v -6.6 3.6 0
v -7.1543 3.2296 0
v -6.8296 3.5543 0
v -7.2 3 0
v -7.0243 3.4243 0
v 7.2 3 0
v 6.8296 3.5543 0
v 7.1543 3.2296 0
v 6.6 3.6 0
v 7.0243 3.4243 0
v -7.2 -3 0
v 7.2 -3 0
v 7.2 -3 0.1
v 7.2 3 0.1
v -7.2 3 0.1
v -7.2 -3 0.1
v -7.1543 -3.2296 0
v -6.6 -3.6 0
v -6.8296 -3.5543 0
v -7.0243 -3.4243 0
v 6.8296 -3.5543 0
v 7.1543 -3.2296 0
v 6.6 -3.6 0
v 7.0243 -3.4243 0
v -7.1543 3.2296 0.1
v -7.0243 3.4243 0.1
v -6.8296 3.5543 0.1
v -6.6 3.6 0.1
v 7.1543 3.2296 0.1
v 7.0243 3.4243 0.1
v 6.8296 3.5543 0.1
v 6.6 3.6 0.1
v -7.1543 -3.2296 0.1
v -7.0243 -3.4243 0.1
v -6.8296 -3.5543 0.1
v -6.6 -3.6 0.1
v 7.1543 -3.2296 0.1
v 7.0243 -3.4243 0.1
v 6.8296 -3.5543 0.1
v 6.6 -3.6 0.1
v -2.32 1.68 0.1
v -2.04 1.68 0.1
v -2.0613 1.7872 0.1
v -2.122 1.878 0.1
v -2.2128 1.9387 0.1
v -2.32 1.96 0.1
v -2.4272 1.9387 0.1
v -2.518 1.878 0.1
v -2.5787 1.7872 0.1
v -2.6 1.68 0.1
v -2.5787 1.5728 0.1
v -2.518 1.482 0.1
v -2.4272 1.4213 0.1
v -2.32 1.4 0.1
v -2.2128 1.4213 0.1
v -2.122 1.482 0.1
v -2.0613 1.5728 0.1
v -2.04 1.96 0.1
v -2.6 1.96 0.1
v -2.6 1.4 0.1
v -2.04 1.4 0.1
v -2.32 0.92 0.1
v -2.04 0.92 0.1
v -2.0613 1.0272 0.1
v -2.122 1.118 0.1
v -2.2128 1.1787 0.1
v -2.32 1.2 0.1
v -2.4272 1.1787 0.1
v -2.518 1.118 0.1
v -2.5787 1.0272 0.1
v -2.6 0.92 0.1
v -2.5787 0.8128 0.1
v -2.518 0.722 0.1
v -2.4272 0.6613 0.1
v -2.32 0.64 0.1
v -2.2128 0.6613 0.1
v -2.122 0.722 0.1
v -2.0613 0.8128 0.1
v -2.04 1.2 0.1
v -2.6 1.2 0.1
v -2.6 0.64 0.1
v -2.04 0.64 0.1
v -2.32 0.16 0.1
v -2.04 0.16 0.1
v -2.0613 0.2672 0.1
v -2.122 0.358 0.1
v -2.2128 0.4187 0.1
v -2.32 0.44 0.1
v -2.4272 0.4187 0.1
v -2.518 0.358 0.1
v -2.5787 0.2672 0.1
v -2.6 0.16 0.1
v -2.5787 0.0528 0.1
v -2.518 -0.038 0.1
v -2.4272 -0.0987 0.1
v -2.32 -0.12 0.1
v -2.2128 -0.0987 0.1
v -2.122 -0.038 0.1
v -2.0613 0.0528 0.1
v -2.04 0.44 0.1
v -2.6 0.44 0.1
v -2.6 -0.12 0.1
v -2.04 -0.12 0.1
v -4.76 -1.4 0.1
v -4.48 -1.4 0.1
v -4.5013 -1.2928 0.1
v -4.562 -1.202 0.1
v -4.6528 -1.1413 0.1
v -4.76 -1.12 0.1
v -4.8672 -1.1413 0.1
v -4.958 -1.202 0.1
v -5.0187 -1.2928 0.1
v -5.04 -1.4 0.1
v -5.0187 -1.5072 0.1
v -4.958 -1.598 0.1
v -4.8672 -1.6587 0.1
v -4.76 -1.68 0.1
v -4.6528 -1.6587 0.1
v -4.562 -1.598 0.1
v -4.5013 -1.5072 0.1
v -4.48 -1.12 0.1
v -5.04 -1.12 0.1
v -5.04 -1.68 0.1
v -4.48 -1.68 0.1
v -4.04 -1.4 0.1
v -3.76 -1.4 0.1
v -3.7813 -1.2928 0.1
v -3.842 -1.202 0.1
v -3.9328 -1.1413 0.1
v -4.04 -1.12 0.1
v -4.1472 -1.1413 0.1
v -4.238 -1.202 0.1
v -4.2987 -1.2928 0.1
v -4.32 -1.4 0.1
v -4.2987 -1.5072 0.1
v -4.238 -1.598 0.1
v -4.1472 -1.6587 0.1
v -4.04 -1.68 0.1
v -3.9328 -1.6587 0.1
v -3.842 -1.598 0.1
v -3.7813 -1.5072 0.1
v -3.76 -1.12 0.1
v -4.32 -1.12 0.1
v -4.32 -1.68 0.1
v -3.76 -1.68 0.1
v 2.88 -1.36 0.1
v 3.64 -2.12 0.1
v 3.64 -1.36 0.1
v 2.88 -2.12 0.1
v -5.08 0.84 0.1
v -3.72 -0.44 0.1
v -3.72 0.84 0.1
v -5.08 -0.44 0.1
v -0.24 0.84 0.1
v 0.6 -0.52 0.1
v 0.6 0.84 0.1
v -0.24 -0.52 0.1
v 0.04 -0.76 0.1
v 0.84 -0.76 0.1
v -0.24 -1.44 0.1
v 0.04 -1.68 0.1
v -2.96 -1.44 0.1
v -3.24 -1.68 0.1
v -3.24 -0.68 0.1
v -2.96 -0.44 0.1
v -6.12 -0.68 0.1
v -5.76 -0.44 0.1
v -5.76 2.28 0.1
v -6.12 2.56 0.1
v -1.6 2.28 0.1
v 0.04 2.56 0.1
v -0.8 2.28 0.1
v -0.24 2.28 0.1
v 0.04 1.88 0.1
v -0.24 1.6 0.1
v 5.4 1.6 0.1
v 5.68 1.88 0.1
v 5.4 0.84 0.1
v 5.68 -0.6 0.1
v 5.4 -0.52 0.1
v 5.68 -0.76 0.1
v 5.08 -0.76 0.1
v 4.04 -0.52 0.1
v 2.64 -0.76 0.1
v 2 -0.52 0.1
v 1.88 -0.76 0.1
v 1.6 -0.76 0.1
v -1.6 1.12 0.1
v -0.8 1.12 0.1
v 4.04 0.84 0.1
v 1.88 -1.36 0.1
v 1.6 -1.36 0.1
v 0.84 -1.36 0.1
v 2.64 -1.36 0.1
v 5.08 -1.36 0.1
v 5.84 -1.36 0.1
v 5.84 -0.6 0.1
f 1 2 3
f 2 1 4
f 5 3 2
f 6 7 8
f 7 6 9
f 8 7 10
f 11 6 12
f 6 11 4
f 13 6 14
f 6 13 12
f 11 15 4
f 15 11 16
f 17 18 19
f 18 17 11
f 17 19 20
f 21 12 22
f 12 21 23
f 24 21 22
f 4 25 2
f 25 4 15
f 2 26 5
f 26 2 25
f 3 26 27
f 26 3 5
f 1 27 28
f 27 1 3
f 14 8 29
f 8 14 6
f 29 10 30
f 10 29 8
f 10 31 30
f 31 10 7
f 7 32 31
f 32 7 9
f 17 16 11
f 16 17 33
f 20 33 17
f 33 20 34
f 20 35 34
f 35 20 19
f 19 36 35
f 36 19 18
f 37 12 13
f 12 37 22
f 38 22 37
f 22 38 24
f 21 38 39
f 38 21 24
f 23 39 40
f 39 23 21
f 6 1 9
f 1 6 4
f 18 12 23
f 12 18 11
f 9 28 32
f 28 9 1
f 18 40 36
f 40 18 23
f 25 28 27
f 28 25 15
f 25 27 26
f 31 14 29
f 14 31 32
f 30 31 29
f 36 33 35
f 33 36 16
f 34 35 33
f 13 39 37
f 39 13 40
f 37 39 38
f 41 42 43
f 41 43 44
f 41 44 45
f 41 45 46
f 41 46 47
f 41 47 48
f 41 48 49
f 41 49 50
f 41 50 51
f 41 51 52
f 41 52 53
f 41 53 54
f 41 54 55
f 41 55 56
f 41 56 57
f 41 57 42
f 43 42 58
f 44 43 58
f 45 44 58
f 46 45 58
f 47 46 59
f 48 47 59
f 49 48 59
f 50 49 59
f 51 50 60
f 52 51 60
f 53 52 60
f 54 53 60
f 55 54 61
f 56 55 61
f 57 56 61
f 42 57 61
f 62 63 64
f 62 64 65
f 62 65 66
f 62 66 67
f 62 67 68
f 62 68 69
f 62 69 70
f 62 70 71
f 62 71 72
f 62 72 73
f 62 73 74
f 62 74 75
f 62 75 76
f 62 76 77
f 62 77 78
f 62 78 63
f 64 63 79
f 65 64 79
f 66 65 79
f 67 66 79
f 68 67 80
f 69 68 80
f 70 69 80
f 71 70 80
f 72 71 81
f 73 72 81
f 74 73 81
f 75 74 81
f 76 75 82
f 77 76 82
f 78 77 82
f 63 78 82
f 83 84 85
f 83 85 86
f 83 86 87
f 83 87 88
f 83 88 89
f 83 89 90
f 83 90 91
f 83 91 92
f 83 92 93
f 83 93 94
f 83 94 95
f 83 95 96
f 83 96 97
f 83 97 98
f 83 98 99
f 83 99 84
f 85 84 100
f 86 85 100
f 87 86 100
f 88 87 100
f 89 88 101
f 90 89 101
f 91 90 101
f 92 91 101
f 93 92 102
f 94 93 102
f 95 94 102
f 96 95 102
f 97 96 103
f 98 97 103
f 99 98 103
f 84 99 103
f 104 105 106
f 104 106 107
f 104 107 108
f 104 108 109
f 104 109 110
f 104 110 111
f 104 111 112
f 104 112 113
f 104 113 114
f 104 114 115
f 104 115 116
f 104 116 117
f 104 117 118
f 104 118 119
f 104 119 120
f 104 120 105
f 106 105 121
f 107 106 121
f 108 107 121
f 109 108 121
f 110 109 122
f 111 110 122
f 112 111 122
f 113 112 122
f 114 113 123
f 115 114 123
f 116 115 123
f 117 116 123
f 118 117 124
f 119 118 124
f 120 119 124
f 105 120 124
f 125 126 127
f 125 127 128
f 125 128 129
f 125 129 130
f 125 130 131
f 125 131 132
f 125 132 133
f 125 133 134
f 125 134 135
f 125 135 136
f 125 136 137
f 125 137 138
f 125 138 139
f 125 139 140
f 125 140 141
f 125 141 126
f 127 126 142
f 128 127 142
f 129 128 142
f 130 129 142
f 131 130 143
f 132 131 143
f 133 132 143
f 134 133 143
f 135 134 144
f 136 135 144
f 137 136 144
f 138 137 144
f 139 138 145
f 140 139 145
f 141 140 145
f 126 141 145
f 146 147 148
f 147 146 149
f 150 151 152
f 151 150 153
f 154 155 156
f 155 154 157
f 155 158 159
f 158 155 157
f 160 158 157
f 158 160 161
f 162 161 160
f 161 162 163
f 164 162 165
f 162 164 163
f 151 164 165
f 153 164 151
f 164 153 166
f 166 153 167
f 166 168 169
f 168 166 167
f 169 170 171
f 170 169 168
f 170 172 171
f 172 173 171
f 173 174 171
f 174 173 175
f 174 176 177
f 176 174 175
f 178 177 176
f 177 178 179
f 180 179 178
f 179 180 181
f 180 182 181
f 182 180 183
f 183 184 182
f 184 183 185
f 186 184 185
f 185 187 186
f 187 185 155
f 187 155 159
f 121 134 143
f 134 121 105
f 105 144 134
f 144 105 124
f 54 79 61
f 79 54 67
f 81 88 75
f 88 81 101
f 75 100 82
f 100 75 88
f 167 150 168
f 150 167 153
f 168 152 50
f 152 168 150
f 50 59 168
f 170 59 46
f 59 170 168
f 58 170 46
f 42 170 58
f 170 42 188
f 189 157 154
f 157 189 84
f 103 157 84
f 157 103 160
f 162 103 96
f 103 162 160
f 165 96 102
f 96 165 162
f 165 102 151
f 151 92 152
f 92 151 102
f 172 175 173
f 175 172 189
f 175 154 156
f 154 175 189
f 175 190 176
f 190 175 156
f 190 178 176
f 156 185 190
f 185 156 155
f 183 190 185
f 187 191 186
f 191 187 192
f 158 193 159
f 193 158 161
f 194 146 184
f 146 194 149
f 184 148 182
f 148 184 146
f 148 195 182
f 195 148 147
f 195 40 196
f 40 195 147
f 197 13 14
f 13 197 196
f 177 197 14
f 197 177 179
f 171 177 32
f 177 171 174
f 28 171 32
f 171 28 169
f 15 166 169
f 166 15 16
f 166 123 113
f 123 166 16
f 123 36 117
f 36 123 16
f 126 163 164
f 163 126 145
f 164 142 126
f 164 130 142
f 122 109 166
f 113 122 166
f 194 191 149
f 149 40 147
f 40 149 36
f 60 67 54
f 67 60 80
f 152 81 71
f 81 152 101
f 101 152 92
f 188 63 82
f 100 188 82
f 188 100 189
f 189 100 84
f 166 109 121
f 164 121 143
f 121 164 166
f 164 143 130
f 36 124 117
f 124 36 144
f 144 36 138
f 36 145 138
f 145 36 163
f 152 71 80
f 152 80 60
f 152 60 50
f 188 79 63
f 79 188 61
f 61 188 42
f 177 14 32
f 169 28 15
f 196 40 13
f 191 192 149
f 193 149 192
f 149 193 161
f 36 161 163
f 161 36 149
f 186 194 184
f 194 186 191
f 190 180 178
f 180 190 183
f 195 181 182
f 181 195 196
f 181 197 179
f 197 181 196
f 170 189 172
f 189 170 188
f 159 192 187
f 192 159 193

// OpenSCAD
// file: ../p/box3u12.scad
use <../lib.scad>
function ldraw_lib__box3u12() = [
// 0 Box with 3 Parallel Faces without Any Edges
// 0 Name: box3u12.dat
// 0 Author: J.C. Tchang [tchang]
// 0 !LDRAW_ORG Primitive UPDATE 2014-02
// 0 !LICENSE Licensed under CC BY 4.0 : see CAreadme.txt
// 
// 0 BFC CERTIFY CCW
  [0,"BFC","CERTIFY"],
  [0,"BFC","CCW"],
// 
// 0 !HISTORY 2014-12-23 [PTadmin] Official Update 2014-02
// 
// 
// 4 16 -1 1 1 1 1 1 1 1 -1 -1 1 -1
  [4,16,-1,1,1,1,1,1,1,1,-1,-1,1,-1],
// 4 16 -1 1 1 -1 0 1 1 0 1 1 1 1
  [4,16,-1,1,1,-1,0,1,1,0,1,1,1,1],
// 4 16 1 1 -1 1 0 -1 -1 0 -1 -1 1 -1
  [4,16,1,1,-1,1,0,-1,-1,0,-1,-1,1,-1],
];
module ldraw_lib__box3u12(step=0, col=false, unit=2/5, alt=false, line=0.2, solid=!$preview)
    makepoly(ldraw_lib__box3u12(), step=step, col=col, unit=unit, alt=alt, line=line, solid=solid);
ldraw_lib__box3u12(line=0.2);
// file: ../p/1-4cyli.scad
use <../lib.scad>
function ldraw_lib__1_4cyli() = [
// 0 Cylinder 0.25
// 0 Name: 1-4cyli.dat
// 0 Author: James Jessiman
// 0 !LDRAW_ORG Primitive UPDATE 2012-01
// 0 !LICENSE Licensed under CC BY 4.0 : see CAreadme.txt
// 
// 0 BFC CERTIFY CCW
  [0,"BFC","CERTIFY"],
  [0,"BFC","CCW"],
// 
// 0 !HISTORY 2002-03-23 [sbliss] Added BFC statement.
// 0 !HISTORY 2002-04-25 [PTadmin] Official Update 2002-02
// 0 !HISTORY 2007-06-22 [PTadmin] Header formatted for Contributor Agreement
// 0 !HISTORY 2008-07-01 [PTadmin] Official Update 2008-01
// 0 !HISTORY 2012-02-16 [Philo] Changed to CCW
// 0 !HISTORY 2012-03-30 [PTadmin] Official Update 2012-01
// 
// 
// 4 16 1 1 0 0.9239 1 0.3827 0.9239 0 0.3827 1 0 0
  [4,16,1,1,0,0.9239,1,0.3827,0.9239,0,0.3827,1,0,0],
// 5 24 1 0 0 1 1 0 0.9239 0 0.3827 1 0 -1
  [5,24,1,0,0,1,1,0,0.9239,0,0.3827,1,0,-1],
// 4 16 0.9239 1 0.3827 0.7071 1 0.7071 0.7071 0 0.7071 0.9239 0 0.3827
  [4,16,0.9239,1,0.3827,0.7071,1,0.7071,0.7071,0,0.7071,0.9239,0,0.3827],
// 5 24 0.9239 0 0.3827 0.9239 1 0.3827 0.7071 0 0.7071 1 0 0
  [5,24,0.9239,0,0.3827,0.9239,1,0.3827,0.7071,0,0.7071,1,0,0],
// 4 16 0.7071 1 0.7071 0.3827 1 0.9239 0.3827 0 0.9239 0.7071 0 0.7071
  [4,16,0.7071,1,0.7071,0.3827,1,0.9239,0.3827,0,0.9239,0.7071,0,0.7071],
// 5 24 0.7071 0 0.7071 0.7071 1 0.7071 0.3827 0 0.9239 0.9239 0 0.3827
  [5,24,0.7071,0,0.7071,0.7071,1,0.7071,0.3827,0,0.9239,0.9239,0,0.3827],
// 4 16 0.3827 1 0.9239 0 1 1 0 0 1 0.3827 0 0.9239
  [4,16,0.3827,1,0.9239,0,1,1,0,0,1,0.3827,0,0.9239],
// 5 24 0.3827 0 0.9239 0.3827 1 0.9239 0 0 1 0.7071 0 0.7071
  [5,24,0.3827,0,0.9239,0.3827,1,0.9239,0,0,1,0.7071,0,0.7071],
// 5 24 0 0 1 0 1 1 0.3827 0 0.9239 -1 0 1
  [5,24,0,0,1,0,1,1,0.3827,0,0.9239,-1,0,1],
];
module ldraw_lib__1_4cyli(step=0, col=false, unit=2/5, alt=false, line=0.2, solid=!$preview)
    makepoly(ldraw_lib__1_4cyli(), step=step, col=col, unit=unit, alt=alt, line=line, solid=solid);
ldraw_lib__1_4cyli(line=0.2);
// file: s/stickerback009x018.scad
use <../../lib.scad>
use <../../p/1-4chrd.scad>
use <../../p/1-4cyli.scad>
use <../../p/box3u12.scad>
function ldraw_lib__s__stickerback009x018() = [
// 0 ~Sticker Back  0.9 x  1.8
// 0 Name: s\stickerback009x018.dat
// 0 Author: Massimo Maso [Sirio]
// 0 !LDRAW_ORG Subpart UPDATE 2026-05
// 0 !LICENSE Licensed under CC BY 4.0 : see CAreadme.txt
// 
// 0 BFC CERTIFY CCW
  [0,"BFC","CERTIFY"],
  [0,"BFC","CCW"],
// 
// 0 !HISTORY 2026-05-31 [OrionP] Official Update 2026-05
// 
// 0 // Primitives
// 1 16 -16.5 0 7.5 -1.5 0 0 0 -1 0 0 0 1.5 1-4chrd.dat
  [1,16,-16.5,0,7.5,-1.5,0,0,0,-1,0,0,0,1.5, ldraw_lib__1_4chrd()],
// 1 16 16.5 0 7.5 1.5 0 0 0 -1 0 0 0 1.5 1-4chrd.dat
  [1,16,16.5,0,7.5,1.5,0,0,0,-1,0,0,0,1.5, ldraw_lib__1_4chrd()],
// 1 16 0 -.25 0 0 0 18 0 .25 0 7.5 0 0 box3u12.dat
  [1,16,0,-.25,0,0,0,18,0,.25,0,7.5,0,0, ldraw_lib__box3u12()],
// 1 16 -16.5 0 -7.5 -1.5 0 0 0 -1 0 0 0 -1.5 1-4chrd.dat
  [1,16,-16.5,0,-7.5,-1.5,0,0,0,-1,0,0,0,-1.5, ldraw_lib__1_4chrd()],
// 1 16 16.5 0 -7.5 1.5 0 0 0 -1 0 0 0 -1.5 1-4chrd.dat
  [1,16,16.5,0,-7.5,1.5,0,0,0,-1,0,0,0,-1.5, ldraw_lib__1_4chrd()],
// 1 16 -16.5 -.25 7.5 -1.5 0 0 0 .25 0 0 0 1.5 1-4cyli.dat
  [1,16,-16.5,-.25,7.5,-1.5,0,0,0,.25,0,0,0,1.5, ldraw_lib__1_4cyli()],
// 1 16 16.5 -.25 7.5 1.5 0 0 0 .25 0 0 0 1.5 1-4cyli.dat
  [1,16,16.5,-.25,7.5,1.5,0,0,0,.25,0,0,0,1.5, ldraw_lib__1_4cyli()],
// 1 16 -16.5 -.25 -7.5 -1.5 0 0 0 .25 0 0 0 -1.5 1-4cyli.dat
  [1,16,-16.5,-.25,-7.5,-1.5,0,0,0,.25,0,0,0,-1.5, ldraw_lib__1_4cyli()],
// 1 16 16.5 -.25 -7.5 1.5 0 0 0 .25 0 0 0 -1.5 1-4cyli.dat
  [1,16,16.5,-.25,-7.5,1.5,0,0,0,.25,0,0,0,-1.5, ldraw_lib__1_4cyli()],
// 0 // Bottom face
// 4 16 -18 0 7.5 -16.5 0 9 16.5 0 9 18 0 7.5
  [4,16,-18,0,7.5,-16.5,0,9,16.5,0,9,18,0,7.5],
// 4 16 -18 0 -7.5 18 0 -7.5 16.5 0 -9 -16.5 0 -9
  [4,16,-18,0,-7.5,18,0,-7.5,16.5,0,-9,-16.5,0,-9],
// 0 // Lateral face
// 4 16 -16.5 0 9 -16.5 -.25 9 16.5 -.25 9 16.5 0 9
  [4,16,-16.5,0,9,-16.5,-.25,9,16.5,-.25,9,16.5,0,9],
// 4 16 16.5 0 -9 16.5 -.25 -9 -16.5 -.25 -9 -16.5 0 -9
  [4,16,16.5,0,-9,16.5,-.25,-9,-16.5,-.25,-9,-16.5,0,-9],
];
module ldraw_lib__s__stickerback009x018(step=0, col=false, unit=2/5, alt=false, line=0.2, solid=!$preview)
    makepoly(ldraw_lib__s__stickerback009x018(), step=step, col=col, unit=unit, alt=alt, line=line, solid=solid);
ldraw_lib__s__stickerback009x018(line=0.2);
// file: ../p/4-4ndis.scad
use <../lib.scad>
function ldraw_lib__4_4ndis() = [
// 0 Disc Negative 1.0
// 0 Name: 4-4ndis.dat
// 0 Author: James Jessiman
// 0 !LDRAW_ORG Primitive UPDATE 2012-01
// 0 !LICENSE Licensed under CC BY 4.0 : see CAreadme.txt
// 
// 0 BFC CERTIFY CCW
  [0,"BFC","CERTIFY"],
  [0,"BFC","CCW"],
// 
// 0 !HISTORY 2002-03-23 [sbliss] Added BFC statement; compacted code
// 0 !HISTORY 2002-04-25 [PTadmin] Official Update 2002-02
// 0 !HISTORY 2007-06-24 [PTadmin] Header formatted for Contributor Agreement
// 0 !HISTORY 2008-07-01 [PTadmin] Official Update 2008-01
// 0 !HISTORY 2012-02-16 [Philo] Changed to CCW
// 0 !HISTORY 2012-03-30 [PTadmin] Official Update 2012-01
// 
// 
// 3 16 0.9239 0 0.3827 1 0 0 1 0 1
  [3,16,0.9239,0,0.3827,1,0,0,1,0,1],
// 3 16 0.7071 0 0.7071 0.9239 0 0.3827 1 0 1
  [3,16,0.7071,0,0.7071,0.9239,0,0.3827,1,0,1],
// 3 16 0.3827 0 0.9239 0.7071 0 0.7071 1 0 1
  [3,16,0.3827,0,0.9239,0.7071,0,0.7071,1,0,1],
// 3 16 0 0 1 0.3827 0 0.9239 1 0 1
  [3,16,0,0,1,0.3827,0,0.9239,1,0,1],
// 3 16 -0.3827 0 0.9239 0 0 1 -1 0 1
  [3,16,-0.3827,0,0.9239,0,0,1,-1,0,1],
// 3 16 -0.7071 0 0.7071 -0.3827 0 0.9239 -1 0 1
  [3,16,-0.7071,0,0.7071,-0.3827,0,0.9239,-1,0,1],
// 3 16 -0.9239 0 0.3827 -0.7071 0 0.7071 -1 0 1
  [3,16,-0.9239,0,0.3827,-0.7071,0,0.7071,-1,0,1],
// 3 16 -1 0 0 -0.9239 0 0.3827 -1 0 1
  [3,16,-1,0,0,-0.9239,0,0.3827,-1,0,1],
// 3 16 -0.9239 0 -0.3827 -1 0 0 -1 0 -1
  [3,16,-0.9239,0,-0.3827,-1,0,0,-1,0,-1],
// 3 16 -0.7071 0 -0.7071 -0.9239 0 -0.3827 -1 0 -1
  [3,16,-0.7071,0,-0.7071,-0.9239,0,-0.3827,-1,0,-1],
// 3 16 -0.3827 0 -0.9239 -0.7071 0 -0.7071 -1 0 -1
  [3,16,-0.3827,0,-0.9239,-0.7071,0,-0.7071,-1,0,-1],
// 3 16 0 0 -1 -0.3827 0 -0.9239 -1 0 -1
  [3,16,0,0,-1,-0.3827,0,-0.9239,-1,0,-1],
// 3 16 0.3827 0 -0.9239 0 0 -1 1 0 -1
  [3,16,0.3827,0,-0.9239,0,0,-1,1,0,-1],
// 3 16 0.7071 0 -0.7071 0.3827 0 -0.9239 1 0 -1
  [3,16,0.7071,0,-0.7071,0.3827,0,-0.9239,1,0,-1],
// 3 16 0.9239 0 -0.3827 0.7071 0 -0.7071 1 0 -1
  [3,16,0.9239,0,-0.3827,0.7071,0,-0.7071,1,0,-1],
// 3 16 1 0 0 0.9239 0 -0.3827 1 0 -1
  [3,16,1,0,0,0.9239,0,-0.3827,1,0,-1],
];
module ldraw_lib__4_4ndis(step=0, col=false, unit=2/5, alt=false, line=0.2, solid=!$preview)
    makepoly(ldraw_lib__4_4ndis(), step=step, col=col, unit=unit, alt=alt, line=line, solid=solid);
ldraw_lib__4_4ndis(line=0.2);
// file: ../p/4-4disc.scad
use <../lib.scad>
function ldraw_lib__4_4disc() = [
// 0 Disc 1.0
// 0 Name: 4-4disc.dat
// 0 Author: James Jessiman
// 0 !LDRAW_ORG Primitive UPDATE 2002-02
// 0 !LICENSE Licensed under CC BY 4.0 : see CAreadme.txt
// 
// 0 BFC CERTIFY CCW
  [0,"BFC","CERTIFY"],
  [0,"BFC","CCW"],
// 
// 0 !HISTORY 1998-12-15 [PTadmin] Official Update 1998-10
// 0 !HISTORY 2002-03-23 [sbliss] Added BFC statement
// 0 !HISTORY 2002-04-25 [PTadmin] Official Update 2002-02
// 0 !HISTORY 2007-06-24 [PTadmin] Header formatted for Contributor Agreement
// 0 !HISTORY 2008-07-01 [PTadmin] Official Update 2008-01
// 
// 
// 3 16 0 0 0 1 0 0 0.9239 0 0.3827
  [3,16,0,0,0,1,0,0,0.9239,0,0.3827],
// 3 16 0 0 0 0.9239 0 0.3827 0.7071 0 0.7071
  [3,16,0,0,0,0.9239,0,0.3827,0.7071,0,0.7071],
// 3 16 0 0 0 0.7071 0 0.7071 0.3827 0 0.9239
  [3,16,0,0,0,0.7071,0,0.7071,0.3827,0,0.9239],
// 3 16 0 0 0 0.3827 0 0.9239 0 0 1
  [3,16,0,0,0,0.3827,0,0.9239,0,0,1],
// 3 16 0 0 0 0 0 1 -0.3827 0 0.9239
  [3,16,0,0,0,0,0,1,-0.3827,0,0.9239],
// 3 16 0 0 0 -0.3827 0 0.9239 -0.7071 0 0.7071
  [3,16,0,0,0,-0.3827,0,0.9239,-0.7071,0,0.7071],
// 3 16 0 0 0 -0.7071 0 0.7071 -0.9239 0 0.3827
  [3,16,0,0,0,-0.7071,0,0.7071,-0.9239,0,0.3827],
// 3 16 0 0 0 -0.9239 0 0.3827 -1 0 -0
  [3,16,0,0,0,-0.9239,0,0.3827,-1,0,-0],
// 3 16 0 0 0 -1 0 -0 -0.9239 0 -0.3827
  [3,16,0,0,0,-1,0,-0,-0.9239,0,-0.3827],
// 3 16 0 0 0 -0.9239 0 -0.3827 -0.7071 0 -0.7071
  [3,16,0,0,0,-0.9239,0,-0.3827,-0.7071,0,-0.7071],
// 3 16 0 0 0 -0.7071 0 -0.7071 -0.3827 0 -0.9239
  [3,16,0,0,0,-0.7071,0,-0.7071,-0.3827,0,-0.9239],
// 3 16 0 0 0 -0.3827 0 -0.9239 0 0 -1
  [3,16,0,0,0,-0.3827,0,-0.9239,0,0,-1],
// 3 16 0 0 0 0 0 -1 0.3827 0 -0.9239
  [3,16,0,0,0,0,0,-1,0.3827,0,-0.9239],
// 3 16 0 0 0 0.3827 0 -0.9239 0.7071 0 -0.7071
  [3,16,0,0,0,0.3827,0,-0.9239,0.7071,0,-0.7071],
// 3 16 0 0 0 0.7071 0 -0.7071 0.9239 0 -0.3827
  [3,16,0,0,0,0.7071,0,-0.7071,0.9239,0,-0.3827],
// 3 16 0 0 0 0.9239 0 -0.3827 1 0 0
  [3,16,0,0,0,0.9239,0,-0.3827,1,0,0],
// 0
];
module ldraw_lib__4_4disc(step=0, col=false, unit=2/5, alt=false, line=0.2, solid=!$preview)
    makepoly(ldraw_lib__4_4disc(), step=step, col=col, unit=unit, alt=alt, line=line, solid=solid);
ldraw_lib__4_4disc(line=0.2);
// file: ../p/1-4chrd.scad
use <../lib.scad>
function ldraw_lib__1_4chrd() = [
// 0 Chord 0.25
// 0 Name: 1-4chrd.dat
// 0 Author: Max Martin Richter [MMR1988]
// 0 !LDRAW_ORG Primitive UPDATE 2023-05
// 0 !LICENSE Licensed under CC BY 4.0 : see CAreadme.txt
// 
// 0 BFC CERTIFY CCW
  [0,"BFC","CERTIFY"],
  [0,"BFC","CCW"],
// 
// 0 !HISTORY 2004-04-22 [PTadmin] Official Update 2004-02
// 0 !HISTORY 2007-10-09 [PTadmin] Header formatted for Contributor Agreement
// 0 !HISTORY 2008-07-01 [PTadmin] Official Update 2008-01
// 0 !HISTORY 2012-08-02 [MMR1988] Re-creation with PrimGen2 and Rectifier
// 0 !HISTORY 2012-08-09 [PTadmin] Official Update 2012-02
// 0 !HISTORY 2023-10-27 [OrionP] Change author to MMR1988 from hafhead
// 0 !HISTORY 2023-10-31 [OrionP] Official Update 2023-05
// 
// 4 16 0.9239 0 0.3827 0.3827 0 0.9239 0 0 1 1 0 0
  [4,16,0.9239,0,0.3827,0.3827,0,0.9239,0,0,1,1,0,0],
// 3 16 0.7071 0 0.7071 0.3827 0 0.9239 0.9239 0 0.3827
  [3,16,0.7071,0,0.7071,0.3827,0,0.9239,0.9239,0,0.3827],
];
module ldraw_lib__1_4chrd(step=0, col=false, unit=2/5, alt=false, line=0.2, solid=!$preview)
    makepoly(ldraw_lib__1_4chrd(), step=step, col=col, unit=unit, alt=alt, line=line, solid=solid);
ldraw_lib__1_4chrd(line=0.2);
// main file
use <../lib.scad>
use <../p/1-4chrd.scad>
use <../p/4-4disc.scad>
use <../p/4-4ndis.scad>
use <s/stickerback009x018.scad>
function ldraw_lib__6058327d() = [
// 0 Sticker  0.9 x  1.8 with Buttons and Circuitry
// 0 Name: 6058327d.dat
// 0 Author: Evert-Jan Boer [ejboer]
// 0 !LDRAW_ORG Part UPDATE 2026-09
// 0 !LICENSE Licensed under CC BY 4.0 : see CAreadme.txt
// 
// 0 BFC CERTIFY CCW
  [0,"BFC","CERTIFY"],
  [0,"BFC","CCW"],
// 
// 0 !CATEGORY Sticker
// 0 !KEYWORDS 75043, AT-AP, Bricklink 75043stk01, Brickowl 73486
// 0 !KEYWORDS Rebrickable 16340
// 
// 0 !HISTORY 2016-12-31 [PTadmin] Official Update 2016-01
// 0 !HISTORY 2026-04-17 [Sirio] Introduced stickerback, changed description and adapted top face
// 0 !HISTORY 2026-09-30 [OrionP] Official Update 2026-09
// 
// 0 // Stickerback
// 1 16 0 0 0 1 0 0 0 1 0 0 0 1 s\stickerback009x018.dat
  [1,16,0,0,0,1,0,0,0,1,0,0,0,1, ldraw_lib__s__stickerback009x018()],
// 0 // Primitives
// 1 72 -16.5 -.25 7.5 -1.5 0 0 0 1 0 0 0 1.5 1-4chrd.dat
  [1,72,-16.5,-.25,7.5,-1.5,0,0,0,1,0,0,0,1.5, ldraw_lib__1_4chrd()],
// 1 72 16.5 -.25 7.5 1.5 0 0 0 1 0 0 0 1.5 1-4chrd.dat
  [1,72,16.5,-.25,7.5,1.5,0,0,0,1,0,0,0,1.5, ldraw_lib__1_4chrd()],
// 1 72 -16.5 -.25 -7.5 -1.5 0 0 0 1 0 0 0 -1.5 1-4chrd.dat
  [1,72,-16.5,-.25,-7.5,-1.5,0,0,0,1,0,0,0,-1.5, ldraw_lib__1_4chrd()],
// 1 72 16.5 -.25 -7.5 1.5 0 0 0 1 0 0 0 -1.5 1-4chrd.dat
  [1,72,16.5,-.25,-7.5,1.5,0,0,0,1,0,0,0,-1.5, ldraw_lib__1_4chrd()],
// 1 4 -5.8 -.25 4.2 .7 0 0 0 1 0 0 0 .7 4-4disc.dat
  [1,4,-5.8,-.25,4.2,.7,0,0,0,1,0,0,0,.7, ldraw_lib__4_4disc()],
// 1 72 -5.8 -.25 4.2 .7 0 0 0 1 0 0 0 .7 4-4ndis.dat
  [1,72,-5.8,-.25,4.2,.7,0,0,0,1,0,0,0,.7, ldraw_lib__4_4ndis()],
// 1 4 -5.8 -.25 2.3 .7 0 0 0 1 0 0 0 .7 4-4disc.dat
  [1,4,-5.8,-.25,2.3,.7,0,0,0,1,0,0,0,.7, ldraw_lib__4_4disc()],
// 1 72 -5.8 -.25 2.3 .7 0 0 0 1 0 0 0 .7 4-4ndis.dat
  [1,72,-5.8,-.25,2.3,.7,0,0,0,1,0,0,0,.7, ldraw_lib__4_4ndis()],
// 1 4 -5.8 -.25 .4 .7 0 0 0 1 0 0 0 .7 4-4disc.dat
  [1,4,-5.8,-.25,.4,.7,0,0,0,1,0,0,0,.7, ldraw_lib__4_4disc()],
// 1 72 -5.8 -.25 .4 .7 0 0 0 1 0 0 0 .7 4-4ndis.dat
  [1,72,-5.8,-.25,.4,.7,0,0,0,1,0,0,0,.7, ldraw_lib__4_4ndis()],
// 1 15 -11.9 -.25 -3.5 .7 0 0 0 1 0 0 0 .7 4-4disc.dat
  [1,15,-11.9,-.25,-3.5,.7,0,0,0,1,0,0,0,.7, ldraw_lib__4_4disc()],
// 1 72 -11.9 -.25 -3.5 .7 0 0 0 1 0 0 0 .7 4-4ndis.dat
  [1,72,-11.9,-.25,-3.5,.7,0,0,0,1,0,0,0,.7, ldraw_lib__4_4ndis()],
// 1 0 -10.1 -.25 -3.5 .7 0 0 0 1 0 0 0 .7 4-4disc.dat
  [1,0,-10.1,-.25,-3.5,.7,0,0,0,1,0,0,0,.7, ldraw_lib__4_4disc()],
// 1 72 -10.1 -.25 -3.5 .7 0 0 0 1 0 0 0 .7 4-4ndis.dat
  [1,72,-10.1,-.25,-3.5,.7,0,0,0,1,0,0,0,.7, ldraw_lib__4_4ndis()],
// 0 // Top face
// 0 // Black faces
// 4 0 9.1 -0.25 -3.4 7.2 -0.25 -3.4 7.2 -0.25 -5.3 9.1 -0.25 -5.3
  [4,0,9.1,-0.25,-3.4,7.2,-0.25,-3.4,7.2,-0.25,-5.3,9.1,-0.25,-5.3],
// 4 0 -9.3 -0.25 2.1 -12.7 -0.25 2.1 -12.7 -0.25 -1.1 -9.3 -0.25 -1.1
  [4,0,-9.3,-0.25,2.1,-12.7,-0.25,2.1,-12.7,-0.25,-1.1,-9.3,-0.25,-1.1],
// 4 0 1.5 -0.25 -1.3 1.5 -0.25 2.1 -0.6 -0.25 2.1 -0.6 -0.25 -1.3
  [4,0,1.5,-0.25,-1.3,1.5,-0.25,2.1,-0.6,-0.25,2.1,-0.6,-0.25,-1.3],
// 4 0 2.1 -0.25 -1.9 1.5 -0.25 -1.3 -0.6 -0.25 -1.3 0.1 -0.25 -1.9
  [4,0,2.1,-0.25,-1.9,1.5,-0.25,-1.3,-0.6,-0.25,-1.3,0.1,-0.25,-1.9],
// 4 0 0.1 -0.25 -1.9 -0.6 -0.25 -1.3 -0.6 -0.25 -3.6 0.1 -0.25 -4.2
  [4,0,0.1,-0.25,-1.9,-0.6,-0.25,-1.3,-0.6,-0.25,-3.6,0.1,-0.25,-4.2],
// 4 0 -8.1 -0.25 -4.2 0.1 -0.25 -4.2 -0.6 -0.25 -3.6 -7.4 -0.25 -3.6
  [4,0,-8.1,-0.25,-4.2,0.1,-0.25,-4.2,-0.6,-0.25,-3.6,-7.4,-0.25,-3.6],
// 4 0 -8.1 -0.25 -1.7 -8.1 -0.25 -4.2 -7.4 -0.25 -3.6 -7.4 -0.25 -1.1
  [4,0,-8.1,-0.25,-1.7,-8.1,-0.25,-4.2,-7.4,-0.25,-3.6,-7.4,-0.25,-1.1],
// 3 0 -9.3 -0.25 -1.1 -8.1 -0.25 -1.7 -7.4 -0.25 -1.1
  [3,0,-9.3,-0.25,-1.1,-8.1,-0.25,-1.7,-7.4,-0.25,-1.1],
// 4 0 -8.1 -0.25 -1.7 -9.3 -0.25 -1.1 -12.7 -0.25 -1.1 -15.3 -0.25 -1.7
  [4,0,-8.1,-0.25,-1.7,-9.3,-0.25,-1.1,-12.7,-0.25,-1.1,-15.3,-0.25,-1.7],
// 3 0 -15.3 -0.25 -1.7 -12.7 -0.25 -1.1 -14.4 -0.25 -1.1
  [3,0,-15.3,-0.25,-1.7,-12.7,-0.25,-1.1,-14.4,-0.25,-1.1],
// 4 0 -15.3 -0.25 6.4 -15.3 -0.25 -1.7 -14.4 -0.25 -1.1 -14.4 -0.25 5.7
  [4,0,-15.3,-0.25,6.4,-15.3,-0.25,-1.7,-14.4,-0.25,-1.1,-14.4,-0.25,5.7],
// 4 0 -15.3 -0.25 6.4 -14.4 -0.25 5.7 -4 -0.25 5.7 0.1 -0.25 6.4
  [4,0,-15.3,-0.25,6.4,-14.4,-0.25,5.7,-4,-0.25,5.7,0.1,-0.25,6.4],
// 3 0 -4 -0.25 5.7 -2 -0.25 5.7 0.1 -0.25 6.4
  [3,0,-4,-0.25,5.7,-2,-0.25,5.7,0.1,-0.25,6.4],
// 3 0 -2 -0.25 5.7 -0.6 -0.25 5.7 0.1 -0.25 6.4
  [3,0,-2,-0.25,5.7,-0.6,-0.25,5.7,0.1,-0.25,6.4],
// 4 0 0.1 -0.25 4.7 0.1 -0.25 6.4 -0.6 -0.25 5.7 -0.6 -0.25 4
  [4,0,0.1,-0.25,4.7,0.1,-0.25,6.4,-0.6,-0.25,5.7,-0.6,-0.25,4],
// 4 0 0.1 -0.25 4.7 -0.6 -0.25 4 13.5 -0.25 4 14.2 -0.25 4.7
  [4,0,0.1,-0.25,4.7,-0.6,-0.25,4,13.5,-0.25,4,14.2,-0.25,4.7],
// 4 0 14.2 -0.25 4.7 13.5 -0.25 4 13.5 -0.25 2.1 14.2 -0.25 -1.5
  [4,0,14.2,-0.25,4.7,13.5,-0.25,4,13.5,-0.25,2.1,14.2,-0.25,-1.5],
// 4 0 14.2 -0.25 -1.5 13.5 -0.25 2.1 13.5 -0.25 -1.3 14.2 -0.25 -1.9
  [4,0,14.2,-0.25,-1.5,13.5,-0.25,2.1,13.5,-0.25,-1.3,14.2,-0.25,-1.9],
// 4 0 12.7 -0.25 -1.9 14.2 -0.25 -1.9 13.5 -0.25 -1.3 10.1 -0.25 -1.3
  [4,0,12.7,-0.25,-1.9,14.2,-0.25,-1.9,13.5,-0.25,-1.3,10.1,-0.25,-1.3],
// 4 0 6.6 -0.25 -1.9 12.7 -0.25 -1.9 10.1 -0.25 -1.3 5 -0.25 -1.3
  [4,0,6.6,-0.25,-1.9,12.7,-0.25,-1.9,10.1,-0.25,-1.3,5,-0.25,-1.3],
// 3 0 4.7 -0.25 -1.9 6.6 -0.25 -1.9 5 -0.25 -1.3
  [3,0,4.7,-0.25,-1.9,6.6,-0.25,-1.9,5,-0.25,-1.3],
// 4 0 4 -0.25 -1.9 4.7 -0.25 -1.9 5 -0.25 -1.3 1.5 -0.25 -1.3
  [4,0,4,-0.25,-1.9,4.7,-0.25,-1.9,5,-0.25,-1.3,1.5,-0.25,-1.3],
// 3 0 4 -0.25 -1.9 1.5 -0.25 -1.3 2.1 -0.25 -1.9
  [3,0,4,-0.25,-1.9,1.5,-0.25,-1.3,2.1,-0.25,-1.9],
// 0 // Grey faces
// 4 72 -11.2 -.25 -2.8 -11.2 -.25 -3.5 -10.8 -.25 -3.5 -10.8 -.25 -2.8
  [4,72,-11.2,-.25,-2.8,-11.2,-.25,-3.5,-10.8,-.25,-3.5,-10.8,-.25,-2.8],
// 4 72 -11.2 -.25 -3.5 -11.2 -.25 -4.2 -10.8 -.25 -4.2 -10.8 -.25 -3.5
  [4,72,-11.2,-.25,-3.5,-11.2,-.25,-4.2,-10.8,-.25,-4.2,-10.8,-.25,-3.5],
// 4 72 -5.8 -.25 3.5 -5.8 -.25 3 -5.1 -.25 3 -5.1 -.25 3.5
  [4,72,-5.8,-.25,3.5,-5.8,-.25,3,-5.1,-.25,3,-5.1,-.25,3.5],
// 4 72 -6.5 -.25 1.6 -6.5 -.25 1.1 -5.8 -.25 1.1 -5.8 -.25 1.6
  [4,72,-6.5,-.25,1.6,-6.5,-.25,1.1,-5.8,-.25,1.1,-5.8,-.25,1.6],
// 4 72 -5.8 -.25 1.6 -5.8 -.25 1.1 -5.1 -.25 1.1 -5.1 -.25 1.6
  [4,72,-5.8,-.25,1.6,-5.8,-.25,1.1,-5.1,-.25,1.1,-5.1,-.25,1.6],
// 4 72 -14.4 -0.25 5.7 -14.4 -0.25 -1.1 -12.7 -0.25 -1.1 -12.7 -0.25 2.1
  [4,72,-14.4,-0.25,5.7,-14.4,-0.25,-1.1,-12.7,-0.25,-1.1,-12.7,-0.25,2.1],
// 4 72 -14.4 -.25 5.7 -12.7 -.25 2.1 -9.3 -.25 2.1 -6.5 -.25 4.2
  [4,72,-14.4,-.25,5.7,-12.7,-.25,2.1,-9.3,-.25,2.1,-6.5,-.25,4.2],
// 3 72 -6.5 -.25 4.2 -6.5 -.25 4.9 -14.4 -.25 5.7
  [3,72,-6.5,-.25,4.2,-6.5,-.25,4.9,-14.4,-.25,5.7],
// 4 72 -14.4 -.25 5.7 -6.5 -.25 4.9 -5.8 -.25 4.9 -4 -.25 5.7
  [4,72,-14.4,-.25,5.7,-6.5,-.25,4.9,-5.8,-.25,4.9,-4,-.25,5.7],
// 3 72 -5.1 -.25 4.9 -4 -.25 5.7 -5.8 -.25 4.9
  [3,72,-5.1,-.25,4.9,-4,-.25,5.7,-5.8,-.25,4.9],
// 4 72 -4 -.25 5.7 -5.1 -.25 4.9 -5.1 -.25 4.2 -4 -.25 2.8
  [4,72,-4,-.25,5.7,-5.1,-.25,4.9,-5.1,-.25,4.2,-4,-.25,2.8],
// 4 72 -.6 -.25 2.1 -2 -.25 2.8 -5.1 -.25 .4 -.6 -.25 -1.3
  [4,72,-.6,-.25,2.1,-2,-.25,2.8,-5.1,-.25,.4,-.6,-.25,-1.3],
// 4 72 -.6 -.25 -3.6 -.6 -.25 -1.3 -5.1 -.25 .4 -5.1 -.25 -.3
  [4,72,-.6,-.25,-3.6,-.6,-.25,-1.3,-5.1,-.25,.4,-5.1,-.25,-.3],
// 4 72 -.6 -.25 -3.6 -5.1 -.25 -.3 -5.8 -.25 -.3 -7.4 -.25 -3.6
  [4,72,-.6,-.25,-3.6,-5.1,-.25,-.3,-5.8,-.25,-.3,-7.4,-.25,-3.6],
// 4 72 -5.8 -.25 -.3 -6.5 -.25 -.3 -7.4 -.25 -1.1 -7.4 -.25 -3.6
  [4,72,-5.8,-.25,-.3,-6.5,-.25,-.3,-7.4,-.25,-1.1,-7.4,-.25,-3.6],
// 3 72 -7.4 -.25 -1.1 -6.5 -.25 -.3 -9.3 -.25 -1.1
  [3,72,-7.4,-.25,-1.1,-6.5,-.25,-.3,-9.3,-.25,-1.1],
// 4 72 -9.3 -.25 -1.1 -6.5 -.25 -.3 -6.5 -.25 .4 -9.3 -.25 2.1
  [4,72,-9.3,-.25,-1.1,-6.5,-.25,-.3,-6.5,-.25,.4,-9.3,-.25,2.1],
// 4 72 -2 -0.25 5.7 -2 -0.25 2.8 -0.6 -0.25 4 -0.6 -0.25 5.7
  [4,72,-2,-0.25,5.7,-2,-0.25,2.8,-0.6,-0.25,4,-0.6,-0.25,5.7],
// 4 72 -0.6 -0.25 4 -2 -0.25 2.8 -0.6 -0.25 2.1 1.5 -0.25 2.1
  [4,72,-0.6,-0.25,4,-2,-0.25,2.8,-0.6,-0.25,2.1,1.5,-0.25,2.1],
// 4 72 -0.6 -0.25 4 1.5 -0.25 2.1 10.1 -0.25 2.1 13.5 -0.25 4
  [4,72,-0.6,-0.25,4,1.5,-0.25,2.1,10.1,-0.25,2.1,13.5,-0.25,4],
// 3 72 10.1 -0.25 2.1 13.5 -0.25 2.1 13.5 -0.25 4
  [3,72,10.1,-0.25,2.1,13.5,-0.25,2.1,13.5,-0.25,4],
// 4 72 1.5 -0.25 2.1 1.5 -0.25 -1.3 5 -0.25 -1.3 10.1 -0.25 2.1
  [4,72,1.5,-0.25,2.1,1.5,-0.25,-1.3,5,-0.25,-1.3,10.1,-0.25,2.1],
// 3 72 10.1 -0.25 -1.3 10.1 -0.25 2.1 5 -0.25 -1.3
  [3,72,10.1,-0.25,-1.3,10.1,-0.25,2.1,5,-0.25,-1.3],
// 4 72 4.7 -0.25 -1.9 4 -0.25 -1.9 4 -0.25 -3.4 4.7 -0.25 -3.4
  [4,72,4.7,-0.25,-1.9,4,-0.25,-1.9,4,-0.25,-3.4,4.7,-0.25,-3.4],
// 4 72 0.1 -0.25 -1.9 0.1 -0.25 -4.2 2.1 -0.25 -3.4 2.1 -0.25 -1.9
  [4,72,0.1,-0.25,-1.9,0.1,-0.25,-4.2,2.1,-0.25,-3.4,2.1,-0.25,-1.9],
// 4 72 7.2 -0.25 -3.4 6.6 -0.25 -1.9 6.6 -0.25 -3.4 7.2 -0.25 -5.3
  [4,72,7.2,-0.25,-3.4,6.6,-0.25,-1.9,6.6,-0.25,-3.4,7.2,-0.25,-5.3],
// 4 72 6.6 -0.25 -1.9 7.2 -0.25 -3.4 9.1 -0.25 -3.4 12.7 -0.25 -1.9
  [4,72,6.6,-0.25,-1.9,7.2,-0.25,-3.4,9.1,-0.25,-3.4,12.7,-0.25,-1.9],
// 4 72 12.7 -0.25 -3.4 12.7 -0.25 -1.9 9.1 -0.25 -3.4 9.1 -0.25 -5.3
  [4,72,12.7,-0.25,-3.4,12.7,-0.25,-1.9,9.1,-0.25,-3.4,9.1,-0.25,-5.3],
// 4 72 12.7 -.25 -3.4 9.1 -.25 -5.3 16.5 -.25 -9 14.6 -.25 -3.4
  [4,72,12.7,-.25,-3.4,9.1,-.25,-5.3,16.5,-.25,-9,14.6,-.25,-3.4],
// 4 72 14.6 -.25 -3.4 18 -.25 -7.5 18 -.25 7.5 14.6 -.25 -1.5
  [4,72,14.6,-.25,-3.4,18,-.25,-7.5,18,-.25,7.5,14.6,-.25,-1.5],
// 4 72 14.6 -.25 -1.5 18 -.25 7.5 14.2 -.25 4.7 14.2 -.25 -1.5
  [4,72,14.6,-.25,-1.5,18,-.25,7.5,14.2,-.25,4.7,14.2,-.25,-1.5],
// 4 72 .1 -.25 4.7 14.2 -.25 4.7 16.5 -.25 9 .1 -.25 6.4
  [4,72,.1,-.25,4.7,14.2,-.25,4.7,16.5,-.25,9,.1,-.25,6.4],
// 4 72 -16.5 -.25 9 -15.3 -.25 6.4 .1 -.25 6.4 16.5 -.25 9
  [4,72,-16.5,-.25,9,-15.3,-.25,6.4,.1,-.25,6.4,16.5,-.25,9],
// 4 72 -15.3 -.25 -1.7 -15.3 -.25 6.4 -18 -.25 7.5 -18 -.25 -7.5
  [4,72,-15.3,-.25,-1.7,-15.3,-.25,6.4,-18,-.25,7.5,-18,-.25,-7.5],
// 4 72 -12.6 -.25 -3.5 -15.3 -.25 -1.7 -18 -.25 -7.5 -12.6 -.25 -4.2
  [4,72,-12.6,-.25,-3.5,-15.3,-.25,-1.7,-18,-.25,-7.5,-12.6,-.25,-4.2],
// 4 72 -18 -.25 -7.5 -16.5 -.25 -9 -11.9 -.25 -4.2 -12.6 -.25 -4.2
  [4,72,-18,-.25,-7.5,-16.5,-.25,-9,-11.9,-.25,-4.2,-12.6,-.25,-4.2],
// 4 72 -9.4 -.25 -3.5 -9.4 -.25 -4.2 -8.1 -.25 -4.2 -8.1 -.25 -1.7
  [4,72,-9.4,-.25,-3.5,-9.4,-.25,-4.2,-8.1,-.25,-4.2,-8.1,-.25,-1.7],
// 3 72 -8.1 -.25 -1.7 -9.4 -.25 -2.8 -9.4 -.25 -3.5
  [3,72,-8.1,-.25,-1.7,-9.4,-.25,-2.8,-9.4,-.25,-3.5],
// 3 72 -8.1 -.25 -1.7 -10.1 -.25 -2.8 -9.4 -.25 -2.8
  [3,72,-8.1,-.25,-1.7,-10.1,-.25,-2.8,-9.4,-.25,-2.8],
// 3 72 -12.6 -.25 -2.8 -11.9 -.25 -2.8 -15.3 -.25 -1.7
  [3,72,-12.6,-.25,-2.8,-11.9,-.25,-2.8,-15.3,-.25,-1.7],
// 3 72 -12.6 -.25 -3.5 -12.6 -.25 -2.8 -15.3 -.25 -1.7
  [3,72,-12.6,-.25,-3.5,-12.6,-.25,-2.8,-15.3,-.25,-1.7],
// 3 72 6.6 -0.25 -3.4 4.7 -0.25 -3.4 7.2 -0.25 -5.3
  [3,72,6.6,-0.25,-3.4,4.7,-0.25,-3.4,7.2,-0.25,-5.3],
// 4 72 7.2 -.25 -5.3 -16.5 -.25 -9 16.5 -.25 -9 9.1 -.25 -5.3
  [4,72,7.2,-.25,-5.3,-16.5,-.25,-9,16.5,-.25,-9,9.1,-.25,-5.3],
// 4 72 -6.5 -.25 3.5 -6.5 -.25 3 -5.8 -.25 3 -5.8 -.25 3.5
  [4,72,-6.5,-.25,3.5,-6.5,-.25,3,-5.8,-.25,3,-5.8,-.25,3.5],
// 3 72 -9.3 -.25 2.1 -6.5 -.25 1.6 -6.5 -.25 2.3
  [3,72,-9.3,-.25,2.1,-6.5,-.25,1.6,-6.5,-.25,2.3],
// 3 72 -6.5 -.25 1.6 -9.3 -.25 2.1 -6.5 -.25 1.1
  [3,72,-6.5,-.25,1.6,-9.3,-.25,2.1,-6.5,-.25,1.1],
// 3 72 -6.5 -.25 1.1 -9.3 -.25 2.1 -6.5 -.25 .4
  [3,72,-6.5,-.25,1.1,-9.3,-.25,2.1,-6.5,-.25,.4],
// 3 72 -4 -.25 2.8 -5.1 -.25 2.3 -5.1 -.25 1.6
  [3,72,-4,-.25,2.8,-5.1,-.25,2.3,-5.1,-.25,1.6],
// 4 72 -5.1 -.25 1.6 -5.1 -.25 1.1 -2 -.25 2.8 -4 -.25 2.8
  [4,72,-5.1,-.25,1.6,-5.1,-.25,1.1,-2,-.25,2.8,-4,-.25,2.8],
// 3 72 -2 -.25 2.8 -5.1 -.25 1.1 -5.1 -.25 .4
  [3,72,-2,-.25,2.8,-5.1,-.25,1.1,-5.1,-.25,.4],
// 3 72 -15.3 -.25 -1.7 -11.9 -.25 -2.8 -11.2 -.25 -2.8
  [3,72,-15.3,-.25,-1.7,-11.9,-.25,-2.8,-11.2,-.25,-2.8],
// 4 72 -8.1 -.25 -1.7 -15.3 -.25 -1.7 -11.2 -.25 -2.8 -10.8 -.25 -2.8
  [4,72,-8.1,-.25,-1.7,-15.3,-.25,-1.7,-11.2,-.25,-2.8,-10.8,-.25,-2.8],
// 3 72 -8.1 -.25 -1.7 -10.8 -.25 -2.8 -10.1 -.25 -2.8
  [3,72,-8.1,-.25,-1.7,-10.8,-.25,-2.8,-10.1,-.25,-2.8],
// 3 72 -16.5 -.25 -9 -11.2 -.25 -4.2 -11.9 -.25 -4.2
  [3,72,-16.5,-.25,-9,-11.2,-.25,-4.2,-11.9,-.25,-4.2],
// 3 72 -11.2 -.25 -4.2 -16.5 -.25 -9 -10.8 -.25 -4.2
  [3,72,-11.2,-.25,-4.2,-16.5,-.25,-9,-10.8,-.25,-4.2],
// 3 72 -10.8 -.25 -4.2 -16.5 -.25 -9 -10.1 -.25 -4.2
  [3,72,-10.8,-.25,-4.2,-16.5,-.25,-9,-10.1,-.25,-4.2],
// 3 72 -16.5 -.25 -9 -9.4 -.25 -4.2 -10.1 -.25 -4.2
  [3,72,-16.5,-.25,-9,-9.4,-.25,-4.2,-10.1,-.25,-4.2],
// 3 72 -9.4 -.25 -4.2 -16.5 -.25 -9 -8.1 -.25 -4.2
  [3,72,-9.4,-.25,-4.2,-16.5,-.25,-9,-8.1,-.25,-4.2],
// 3 72 -9.3 -.25 2.1 -6.5 -.25 2.3 -6.5 -.25 3
  [3,72,-9.3,-.25,2.1,-6.5,-.25,2.3,-6.5,-.25,3],
// 3 72 -9.3 -.25 2.1 -6.5 -.25 3 -6.5 -.25 3.5
  [3,72,-9.3,-.25,2.1,-6.5,-.25,3,-6.5,-.25,3.5],
// 3 72 -9.3 -.25 2.1 -6.5 -.25 3.5 -6.5 -.25 4.2
  [3,72,-9.3,-.25,2.1,-6.5,-.25,3.5,-6.5,-.25,4.2],
// 3 72 -4 -.25 2.8 -5.1 -.25 3 -5.1 -.25 2.3
  [3,72,-4,-.25,2.8,-5.1,-.25,3,-5.1,-.25,2.3],
// 3 72 -5.1 -.25 3 -4 -.25 2.8 -5.1 -.25 3.5
  [3,72,-5.1,-.25,3,-4,-.25,2.8,-5.1,-.25,3.5],
// 3 72 -5.1 -.25 3.5 -4 -.25 2.8 -5.1 -.25 4.2
  [3,72,-5.1,-.25,3.5,-4,-.25,2.8,-5.1,-.25,4.2],
// 3 72 14.2 -.25 4.7 18 -.25 7.5 16.5 -.25 9
  [3,72,14.2,-.25,4.7,18,-.25,7.5,16.5,-.25,9],
// 3 72 -15.3 -.25 6.4 -16.5 -.25 9 -18 -.25 7.5
  [3,72,-15.3,-.25,6.4,-16.5,-.25,9,-18,-.25,7.5],
// 3 72 14.6 -.25 -3.4 16.5 -.25 -9 18 -.25 -7.5
  [3,72,14.6,-.25,-3.4,16.5,-.25,-9,18,-.25,-7.5],
// 3 72 4.7 -.25 -3.4 4 -.25 -3.4 7.2 -.25 -5.3
  [3,72,4.7,-.25,-3.4,4,-.25,-3.4,7.2,-.25,-5.3],
// 4 72 2.1 -.25 -3.4 .1 -.25 -4.2 7.2 -.25 -5.3 4 -.25 -3.4
  [4,72,2.1,-.25,-3.4,.1,-.25,-4.2,7.2,-.25,-5.3,4,-.25,-3.4],
// 4 72 -8.1 -.25 -4.2 -16.5 -.25 -9 7.2 -.25 -5.3 .1 -.25 -4.2
  [4,72,-8.1,-.25,-4.2,-16.5,-.25,-9,7.2,-.25,-5.3,.1,-.25,-4.2],
// 0 // Red faces
// 4 4 6.6 -0.25 -1.9 4.7 -0.25 -1.9 4.7 -0.25 -3.4 6.6 -0.25 -3.4
  [4,4,6.6,-0.25,-1.9,4.7,-0.25,-1.9,4.7,-0.25,-3.4,6.6,-0.25,-3.4],
// 4 4 13.5 -0.25 2.1 10.1 -0.25 2.1 10.1 -0.25 -1.3 13.5 -0.25 -1.3
  [4,4,13.5,-0.25,2.1,10.1,-0.25,2.1,10.1,-0.25,-1.3,13.5,-0.25,-1.3],
// 4 4 14.2 -0.25 -1.9 12.7 -0.25 -1.9 12.7 -0.25 -3.4 14.6 -0.25 -3.4
  [4,4,14.2,-0.25,-1.9,12.7,-0.25,-1.9,12.7,-0.25,-3.4,14.6,-0.25,-3.4],
// 4 4 14.2 -0.25 -1.9 14.6 -0.25 -3.4 14.6 -0.25 -1.5 14.2 -0.25 -1.5
  [4,4,14.2,-0.25,-1.9,14.6,-0.25,-3.4,14.6,-0.25,-1.5,14.2,-0.25,-1.5],
// 0 // White faces
// 4 15 -2 -0.25 5.7 -4 -0.25 5.7 -4 -0.25 2.8 -2 -0.25 2.8
  [4,15,-2,-0.25,5.7,-4,-0.25,5.7,-4,-0.25,2.8,-2,-0.25,2.8],
// 4 15 4 -0.25 -1.9 2.1 -0.25 -1.9 2.1 -0.25 -3.4 4 -0.25 -3.4
  [4,15,4,-0.25,-1.9,2.1,-0.25,-1.9,2.1,-0.25,-3.4,4,-0.25,-3.4],
];
module ldraw_lib__6058327d(step=0, col=false, unit=2/5, alt=false, line=0.2, solid=!$preview)
    makepoly(ldraw_lib__6058327d(), step=step, col=col, unit=unit, alt=alt, line=line, solid=solid);
ldraw_lib__6058327d(line=0.2);
